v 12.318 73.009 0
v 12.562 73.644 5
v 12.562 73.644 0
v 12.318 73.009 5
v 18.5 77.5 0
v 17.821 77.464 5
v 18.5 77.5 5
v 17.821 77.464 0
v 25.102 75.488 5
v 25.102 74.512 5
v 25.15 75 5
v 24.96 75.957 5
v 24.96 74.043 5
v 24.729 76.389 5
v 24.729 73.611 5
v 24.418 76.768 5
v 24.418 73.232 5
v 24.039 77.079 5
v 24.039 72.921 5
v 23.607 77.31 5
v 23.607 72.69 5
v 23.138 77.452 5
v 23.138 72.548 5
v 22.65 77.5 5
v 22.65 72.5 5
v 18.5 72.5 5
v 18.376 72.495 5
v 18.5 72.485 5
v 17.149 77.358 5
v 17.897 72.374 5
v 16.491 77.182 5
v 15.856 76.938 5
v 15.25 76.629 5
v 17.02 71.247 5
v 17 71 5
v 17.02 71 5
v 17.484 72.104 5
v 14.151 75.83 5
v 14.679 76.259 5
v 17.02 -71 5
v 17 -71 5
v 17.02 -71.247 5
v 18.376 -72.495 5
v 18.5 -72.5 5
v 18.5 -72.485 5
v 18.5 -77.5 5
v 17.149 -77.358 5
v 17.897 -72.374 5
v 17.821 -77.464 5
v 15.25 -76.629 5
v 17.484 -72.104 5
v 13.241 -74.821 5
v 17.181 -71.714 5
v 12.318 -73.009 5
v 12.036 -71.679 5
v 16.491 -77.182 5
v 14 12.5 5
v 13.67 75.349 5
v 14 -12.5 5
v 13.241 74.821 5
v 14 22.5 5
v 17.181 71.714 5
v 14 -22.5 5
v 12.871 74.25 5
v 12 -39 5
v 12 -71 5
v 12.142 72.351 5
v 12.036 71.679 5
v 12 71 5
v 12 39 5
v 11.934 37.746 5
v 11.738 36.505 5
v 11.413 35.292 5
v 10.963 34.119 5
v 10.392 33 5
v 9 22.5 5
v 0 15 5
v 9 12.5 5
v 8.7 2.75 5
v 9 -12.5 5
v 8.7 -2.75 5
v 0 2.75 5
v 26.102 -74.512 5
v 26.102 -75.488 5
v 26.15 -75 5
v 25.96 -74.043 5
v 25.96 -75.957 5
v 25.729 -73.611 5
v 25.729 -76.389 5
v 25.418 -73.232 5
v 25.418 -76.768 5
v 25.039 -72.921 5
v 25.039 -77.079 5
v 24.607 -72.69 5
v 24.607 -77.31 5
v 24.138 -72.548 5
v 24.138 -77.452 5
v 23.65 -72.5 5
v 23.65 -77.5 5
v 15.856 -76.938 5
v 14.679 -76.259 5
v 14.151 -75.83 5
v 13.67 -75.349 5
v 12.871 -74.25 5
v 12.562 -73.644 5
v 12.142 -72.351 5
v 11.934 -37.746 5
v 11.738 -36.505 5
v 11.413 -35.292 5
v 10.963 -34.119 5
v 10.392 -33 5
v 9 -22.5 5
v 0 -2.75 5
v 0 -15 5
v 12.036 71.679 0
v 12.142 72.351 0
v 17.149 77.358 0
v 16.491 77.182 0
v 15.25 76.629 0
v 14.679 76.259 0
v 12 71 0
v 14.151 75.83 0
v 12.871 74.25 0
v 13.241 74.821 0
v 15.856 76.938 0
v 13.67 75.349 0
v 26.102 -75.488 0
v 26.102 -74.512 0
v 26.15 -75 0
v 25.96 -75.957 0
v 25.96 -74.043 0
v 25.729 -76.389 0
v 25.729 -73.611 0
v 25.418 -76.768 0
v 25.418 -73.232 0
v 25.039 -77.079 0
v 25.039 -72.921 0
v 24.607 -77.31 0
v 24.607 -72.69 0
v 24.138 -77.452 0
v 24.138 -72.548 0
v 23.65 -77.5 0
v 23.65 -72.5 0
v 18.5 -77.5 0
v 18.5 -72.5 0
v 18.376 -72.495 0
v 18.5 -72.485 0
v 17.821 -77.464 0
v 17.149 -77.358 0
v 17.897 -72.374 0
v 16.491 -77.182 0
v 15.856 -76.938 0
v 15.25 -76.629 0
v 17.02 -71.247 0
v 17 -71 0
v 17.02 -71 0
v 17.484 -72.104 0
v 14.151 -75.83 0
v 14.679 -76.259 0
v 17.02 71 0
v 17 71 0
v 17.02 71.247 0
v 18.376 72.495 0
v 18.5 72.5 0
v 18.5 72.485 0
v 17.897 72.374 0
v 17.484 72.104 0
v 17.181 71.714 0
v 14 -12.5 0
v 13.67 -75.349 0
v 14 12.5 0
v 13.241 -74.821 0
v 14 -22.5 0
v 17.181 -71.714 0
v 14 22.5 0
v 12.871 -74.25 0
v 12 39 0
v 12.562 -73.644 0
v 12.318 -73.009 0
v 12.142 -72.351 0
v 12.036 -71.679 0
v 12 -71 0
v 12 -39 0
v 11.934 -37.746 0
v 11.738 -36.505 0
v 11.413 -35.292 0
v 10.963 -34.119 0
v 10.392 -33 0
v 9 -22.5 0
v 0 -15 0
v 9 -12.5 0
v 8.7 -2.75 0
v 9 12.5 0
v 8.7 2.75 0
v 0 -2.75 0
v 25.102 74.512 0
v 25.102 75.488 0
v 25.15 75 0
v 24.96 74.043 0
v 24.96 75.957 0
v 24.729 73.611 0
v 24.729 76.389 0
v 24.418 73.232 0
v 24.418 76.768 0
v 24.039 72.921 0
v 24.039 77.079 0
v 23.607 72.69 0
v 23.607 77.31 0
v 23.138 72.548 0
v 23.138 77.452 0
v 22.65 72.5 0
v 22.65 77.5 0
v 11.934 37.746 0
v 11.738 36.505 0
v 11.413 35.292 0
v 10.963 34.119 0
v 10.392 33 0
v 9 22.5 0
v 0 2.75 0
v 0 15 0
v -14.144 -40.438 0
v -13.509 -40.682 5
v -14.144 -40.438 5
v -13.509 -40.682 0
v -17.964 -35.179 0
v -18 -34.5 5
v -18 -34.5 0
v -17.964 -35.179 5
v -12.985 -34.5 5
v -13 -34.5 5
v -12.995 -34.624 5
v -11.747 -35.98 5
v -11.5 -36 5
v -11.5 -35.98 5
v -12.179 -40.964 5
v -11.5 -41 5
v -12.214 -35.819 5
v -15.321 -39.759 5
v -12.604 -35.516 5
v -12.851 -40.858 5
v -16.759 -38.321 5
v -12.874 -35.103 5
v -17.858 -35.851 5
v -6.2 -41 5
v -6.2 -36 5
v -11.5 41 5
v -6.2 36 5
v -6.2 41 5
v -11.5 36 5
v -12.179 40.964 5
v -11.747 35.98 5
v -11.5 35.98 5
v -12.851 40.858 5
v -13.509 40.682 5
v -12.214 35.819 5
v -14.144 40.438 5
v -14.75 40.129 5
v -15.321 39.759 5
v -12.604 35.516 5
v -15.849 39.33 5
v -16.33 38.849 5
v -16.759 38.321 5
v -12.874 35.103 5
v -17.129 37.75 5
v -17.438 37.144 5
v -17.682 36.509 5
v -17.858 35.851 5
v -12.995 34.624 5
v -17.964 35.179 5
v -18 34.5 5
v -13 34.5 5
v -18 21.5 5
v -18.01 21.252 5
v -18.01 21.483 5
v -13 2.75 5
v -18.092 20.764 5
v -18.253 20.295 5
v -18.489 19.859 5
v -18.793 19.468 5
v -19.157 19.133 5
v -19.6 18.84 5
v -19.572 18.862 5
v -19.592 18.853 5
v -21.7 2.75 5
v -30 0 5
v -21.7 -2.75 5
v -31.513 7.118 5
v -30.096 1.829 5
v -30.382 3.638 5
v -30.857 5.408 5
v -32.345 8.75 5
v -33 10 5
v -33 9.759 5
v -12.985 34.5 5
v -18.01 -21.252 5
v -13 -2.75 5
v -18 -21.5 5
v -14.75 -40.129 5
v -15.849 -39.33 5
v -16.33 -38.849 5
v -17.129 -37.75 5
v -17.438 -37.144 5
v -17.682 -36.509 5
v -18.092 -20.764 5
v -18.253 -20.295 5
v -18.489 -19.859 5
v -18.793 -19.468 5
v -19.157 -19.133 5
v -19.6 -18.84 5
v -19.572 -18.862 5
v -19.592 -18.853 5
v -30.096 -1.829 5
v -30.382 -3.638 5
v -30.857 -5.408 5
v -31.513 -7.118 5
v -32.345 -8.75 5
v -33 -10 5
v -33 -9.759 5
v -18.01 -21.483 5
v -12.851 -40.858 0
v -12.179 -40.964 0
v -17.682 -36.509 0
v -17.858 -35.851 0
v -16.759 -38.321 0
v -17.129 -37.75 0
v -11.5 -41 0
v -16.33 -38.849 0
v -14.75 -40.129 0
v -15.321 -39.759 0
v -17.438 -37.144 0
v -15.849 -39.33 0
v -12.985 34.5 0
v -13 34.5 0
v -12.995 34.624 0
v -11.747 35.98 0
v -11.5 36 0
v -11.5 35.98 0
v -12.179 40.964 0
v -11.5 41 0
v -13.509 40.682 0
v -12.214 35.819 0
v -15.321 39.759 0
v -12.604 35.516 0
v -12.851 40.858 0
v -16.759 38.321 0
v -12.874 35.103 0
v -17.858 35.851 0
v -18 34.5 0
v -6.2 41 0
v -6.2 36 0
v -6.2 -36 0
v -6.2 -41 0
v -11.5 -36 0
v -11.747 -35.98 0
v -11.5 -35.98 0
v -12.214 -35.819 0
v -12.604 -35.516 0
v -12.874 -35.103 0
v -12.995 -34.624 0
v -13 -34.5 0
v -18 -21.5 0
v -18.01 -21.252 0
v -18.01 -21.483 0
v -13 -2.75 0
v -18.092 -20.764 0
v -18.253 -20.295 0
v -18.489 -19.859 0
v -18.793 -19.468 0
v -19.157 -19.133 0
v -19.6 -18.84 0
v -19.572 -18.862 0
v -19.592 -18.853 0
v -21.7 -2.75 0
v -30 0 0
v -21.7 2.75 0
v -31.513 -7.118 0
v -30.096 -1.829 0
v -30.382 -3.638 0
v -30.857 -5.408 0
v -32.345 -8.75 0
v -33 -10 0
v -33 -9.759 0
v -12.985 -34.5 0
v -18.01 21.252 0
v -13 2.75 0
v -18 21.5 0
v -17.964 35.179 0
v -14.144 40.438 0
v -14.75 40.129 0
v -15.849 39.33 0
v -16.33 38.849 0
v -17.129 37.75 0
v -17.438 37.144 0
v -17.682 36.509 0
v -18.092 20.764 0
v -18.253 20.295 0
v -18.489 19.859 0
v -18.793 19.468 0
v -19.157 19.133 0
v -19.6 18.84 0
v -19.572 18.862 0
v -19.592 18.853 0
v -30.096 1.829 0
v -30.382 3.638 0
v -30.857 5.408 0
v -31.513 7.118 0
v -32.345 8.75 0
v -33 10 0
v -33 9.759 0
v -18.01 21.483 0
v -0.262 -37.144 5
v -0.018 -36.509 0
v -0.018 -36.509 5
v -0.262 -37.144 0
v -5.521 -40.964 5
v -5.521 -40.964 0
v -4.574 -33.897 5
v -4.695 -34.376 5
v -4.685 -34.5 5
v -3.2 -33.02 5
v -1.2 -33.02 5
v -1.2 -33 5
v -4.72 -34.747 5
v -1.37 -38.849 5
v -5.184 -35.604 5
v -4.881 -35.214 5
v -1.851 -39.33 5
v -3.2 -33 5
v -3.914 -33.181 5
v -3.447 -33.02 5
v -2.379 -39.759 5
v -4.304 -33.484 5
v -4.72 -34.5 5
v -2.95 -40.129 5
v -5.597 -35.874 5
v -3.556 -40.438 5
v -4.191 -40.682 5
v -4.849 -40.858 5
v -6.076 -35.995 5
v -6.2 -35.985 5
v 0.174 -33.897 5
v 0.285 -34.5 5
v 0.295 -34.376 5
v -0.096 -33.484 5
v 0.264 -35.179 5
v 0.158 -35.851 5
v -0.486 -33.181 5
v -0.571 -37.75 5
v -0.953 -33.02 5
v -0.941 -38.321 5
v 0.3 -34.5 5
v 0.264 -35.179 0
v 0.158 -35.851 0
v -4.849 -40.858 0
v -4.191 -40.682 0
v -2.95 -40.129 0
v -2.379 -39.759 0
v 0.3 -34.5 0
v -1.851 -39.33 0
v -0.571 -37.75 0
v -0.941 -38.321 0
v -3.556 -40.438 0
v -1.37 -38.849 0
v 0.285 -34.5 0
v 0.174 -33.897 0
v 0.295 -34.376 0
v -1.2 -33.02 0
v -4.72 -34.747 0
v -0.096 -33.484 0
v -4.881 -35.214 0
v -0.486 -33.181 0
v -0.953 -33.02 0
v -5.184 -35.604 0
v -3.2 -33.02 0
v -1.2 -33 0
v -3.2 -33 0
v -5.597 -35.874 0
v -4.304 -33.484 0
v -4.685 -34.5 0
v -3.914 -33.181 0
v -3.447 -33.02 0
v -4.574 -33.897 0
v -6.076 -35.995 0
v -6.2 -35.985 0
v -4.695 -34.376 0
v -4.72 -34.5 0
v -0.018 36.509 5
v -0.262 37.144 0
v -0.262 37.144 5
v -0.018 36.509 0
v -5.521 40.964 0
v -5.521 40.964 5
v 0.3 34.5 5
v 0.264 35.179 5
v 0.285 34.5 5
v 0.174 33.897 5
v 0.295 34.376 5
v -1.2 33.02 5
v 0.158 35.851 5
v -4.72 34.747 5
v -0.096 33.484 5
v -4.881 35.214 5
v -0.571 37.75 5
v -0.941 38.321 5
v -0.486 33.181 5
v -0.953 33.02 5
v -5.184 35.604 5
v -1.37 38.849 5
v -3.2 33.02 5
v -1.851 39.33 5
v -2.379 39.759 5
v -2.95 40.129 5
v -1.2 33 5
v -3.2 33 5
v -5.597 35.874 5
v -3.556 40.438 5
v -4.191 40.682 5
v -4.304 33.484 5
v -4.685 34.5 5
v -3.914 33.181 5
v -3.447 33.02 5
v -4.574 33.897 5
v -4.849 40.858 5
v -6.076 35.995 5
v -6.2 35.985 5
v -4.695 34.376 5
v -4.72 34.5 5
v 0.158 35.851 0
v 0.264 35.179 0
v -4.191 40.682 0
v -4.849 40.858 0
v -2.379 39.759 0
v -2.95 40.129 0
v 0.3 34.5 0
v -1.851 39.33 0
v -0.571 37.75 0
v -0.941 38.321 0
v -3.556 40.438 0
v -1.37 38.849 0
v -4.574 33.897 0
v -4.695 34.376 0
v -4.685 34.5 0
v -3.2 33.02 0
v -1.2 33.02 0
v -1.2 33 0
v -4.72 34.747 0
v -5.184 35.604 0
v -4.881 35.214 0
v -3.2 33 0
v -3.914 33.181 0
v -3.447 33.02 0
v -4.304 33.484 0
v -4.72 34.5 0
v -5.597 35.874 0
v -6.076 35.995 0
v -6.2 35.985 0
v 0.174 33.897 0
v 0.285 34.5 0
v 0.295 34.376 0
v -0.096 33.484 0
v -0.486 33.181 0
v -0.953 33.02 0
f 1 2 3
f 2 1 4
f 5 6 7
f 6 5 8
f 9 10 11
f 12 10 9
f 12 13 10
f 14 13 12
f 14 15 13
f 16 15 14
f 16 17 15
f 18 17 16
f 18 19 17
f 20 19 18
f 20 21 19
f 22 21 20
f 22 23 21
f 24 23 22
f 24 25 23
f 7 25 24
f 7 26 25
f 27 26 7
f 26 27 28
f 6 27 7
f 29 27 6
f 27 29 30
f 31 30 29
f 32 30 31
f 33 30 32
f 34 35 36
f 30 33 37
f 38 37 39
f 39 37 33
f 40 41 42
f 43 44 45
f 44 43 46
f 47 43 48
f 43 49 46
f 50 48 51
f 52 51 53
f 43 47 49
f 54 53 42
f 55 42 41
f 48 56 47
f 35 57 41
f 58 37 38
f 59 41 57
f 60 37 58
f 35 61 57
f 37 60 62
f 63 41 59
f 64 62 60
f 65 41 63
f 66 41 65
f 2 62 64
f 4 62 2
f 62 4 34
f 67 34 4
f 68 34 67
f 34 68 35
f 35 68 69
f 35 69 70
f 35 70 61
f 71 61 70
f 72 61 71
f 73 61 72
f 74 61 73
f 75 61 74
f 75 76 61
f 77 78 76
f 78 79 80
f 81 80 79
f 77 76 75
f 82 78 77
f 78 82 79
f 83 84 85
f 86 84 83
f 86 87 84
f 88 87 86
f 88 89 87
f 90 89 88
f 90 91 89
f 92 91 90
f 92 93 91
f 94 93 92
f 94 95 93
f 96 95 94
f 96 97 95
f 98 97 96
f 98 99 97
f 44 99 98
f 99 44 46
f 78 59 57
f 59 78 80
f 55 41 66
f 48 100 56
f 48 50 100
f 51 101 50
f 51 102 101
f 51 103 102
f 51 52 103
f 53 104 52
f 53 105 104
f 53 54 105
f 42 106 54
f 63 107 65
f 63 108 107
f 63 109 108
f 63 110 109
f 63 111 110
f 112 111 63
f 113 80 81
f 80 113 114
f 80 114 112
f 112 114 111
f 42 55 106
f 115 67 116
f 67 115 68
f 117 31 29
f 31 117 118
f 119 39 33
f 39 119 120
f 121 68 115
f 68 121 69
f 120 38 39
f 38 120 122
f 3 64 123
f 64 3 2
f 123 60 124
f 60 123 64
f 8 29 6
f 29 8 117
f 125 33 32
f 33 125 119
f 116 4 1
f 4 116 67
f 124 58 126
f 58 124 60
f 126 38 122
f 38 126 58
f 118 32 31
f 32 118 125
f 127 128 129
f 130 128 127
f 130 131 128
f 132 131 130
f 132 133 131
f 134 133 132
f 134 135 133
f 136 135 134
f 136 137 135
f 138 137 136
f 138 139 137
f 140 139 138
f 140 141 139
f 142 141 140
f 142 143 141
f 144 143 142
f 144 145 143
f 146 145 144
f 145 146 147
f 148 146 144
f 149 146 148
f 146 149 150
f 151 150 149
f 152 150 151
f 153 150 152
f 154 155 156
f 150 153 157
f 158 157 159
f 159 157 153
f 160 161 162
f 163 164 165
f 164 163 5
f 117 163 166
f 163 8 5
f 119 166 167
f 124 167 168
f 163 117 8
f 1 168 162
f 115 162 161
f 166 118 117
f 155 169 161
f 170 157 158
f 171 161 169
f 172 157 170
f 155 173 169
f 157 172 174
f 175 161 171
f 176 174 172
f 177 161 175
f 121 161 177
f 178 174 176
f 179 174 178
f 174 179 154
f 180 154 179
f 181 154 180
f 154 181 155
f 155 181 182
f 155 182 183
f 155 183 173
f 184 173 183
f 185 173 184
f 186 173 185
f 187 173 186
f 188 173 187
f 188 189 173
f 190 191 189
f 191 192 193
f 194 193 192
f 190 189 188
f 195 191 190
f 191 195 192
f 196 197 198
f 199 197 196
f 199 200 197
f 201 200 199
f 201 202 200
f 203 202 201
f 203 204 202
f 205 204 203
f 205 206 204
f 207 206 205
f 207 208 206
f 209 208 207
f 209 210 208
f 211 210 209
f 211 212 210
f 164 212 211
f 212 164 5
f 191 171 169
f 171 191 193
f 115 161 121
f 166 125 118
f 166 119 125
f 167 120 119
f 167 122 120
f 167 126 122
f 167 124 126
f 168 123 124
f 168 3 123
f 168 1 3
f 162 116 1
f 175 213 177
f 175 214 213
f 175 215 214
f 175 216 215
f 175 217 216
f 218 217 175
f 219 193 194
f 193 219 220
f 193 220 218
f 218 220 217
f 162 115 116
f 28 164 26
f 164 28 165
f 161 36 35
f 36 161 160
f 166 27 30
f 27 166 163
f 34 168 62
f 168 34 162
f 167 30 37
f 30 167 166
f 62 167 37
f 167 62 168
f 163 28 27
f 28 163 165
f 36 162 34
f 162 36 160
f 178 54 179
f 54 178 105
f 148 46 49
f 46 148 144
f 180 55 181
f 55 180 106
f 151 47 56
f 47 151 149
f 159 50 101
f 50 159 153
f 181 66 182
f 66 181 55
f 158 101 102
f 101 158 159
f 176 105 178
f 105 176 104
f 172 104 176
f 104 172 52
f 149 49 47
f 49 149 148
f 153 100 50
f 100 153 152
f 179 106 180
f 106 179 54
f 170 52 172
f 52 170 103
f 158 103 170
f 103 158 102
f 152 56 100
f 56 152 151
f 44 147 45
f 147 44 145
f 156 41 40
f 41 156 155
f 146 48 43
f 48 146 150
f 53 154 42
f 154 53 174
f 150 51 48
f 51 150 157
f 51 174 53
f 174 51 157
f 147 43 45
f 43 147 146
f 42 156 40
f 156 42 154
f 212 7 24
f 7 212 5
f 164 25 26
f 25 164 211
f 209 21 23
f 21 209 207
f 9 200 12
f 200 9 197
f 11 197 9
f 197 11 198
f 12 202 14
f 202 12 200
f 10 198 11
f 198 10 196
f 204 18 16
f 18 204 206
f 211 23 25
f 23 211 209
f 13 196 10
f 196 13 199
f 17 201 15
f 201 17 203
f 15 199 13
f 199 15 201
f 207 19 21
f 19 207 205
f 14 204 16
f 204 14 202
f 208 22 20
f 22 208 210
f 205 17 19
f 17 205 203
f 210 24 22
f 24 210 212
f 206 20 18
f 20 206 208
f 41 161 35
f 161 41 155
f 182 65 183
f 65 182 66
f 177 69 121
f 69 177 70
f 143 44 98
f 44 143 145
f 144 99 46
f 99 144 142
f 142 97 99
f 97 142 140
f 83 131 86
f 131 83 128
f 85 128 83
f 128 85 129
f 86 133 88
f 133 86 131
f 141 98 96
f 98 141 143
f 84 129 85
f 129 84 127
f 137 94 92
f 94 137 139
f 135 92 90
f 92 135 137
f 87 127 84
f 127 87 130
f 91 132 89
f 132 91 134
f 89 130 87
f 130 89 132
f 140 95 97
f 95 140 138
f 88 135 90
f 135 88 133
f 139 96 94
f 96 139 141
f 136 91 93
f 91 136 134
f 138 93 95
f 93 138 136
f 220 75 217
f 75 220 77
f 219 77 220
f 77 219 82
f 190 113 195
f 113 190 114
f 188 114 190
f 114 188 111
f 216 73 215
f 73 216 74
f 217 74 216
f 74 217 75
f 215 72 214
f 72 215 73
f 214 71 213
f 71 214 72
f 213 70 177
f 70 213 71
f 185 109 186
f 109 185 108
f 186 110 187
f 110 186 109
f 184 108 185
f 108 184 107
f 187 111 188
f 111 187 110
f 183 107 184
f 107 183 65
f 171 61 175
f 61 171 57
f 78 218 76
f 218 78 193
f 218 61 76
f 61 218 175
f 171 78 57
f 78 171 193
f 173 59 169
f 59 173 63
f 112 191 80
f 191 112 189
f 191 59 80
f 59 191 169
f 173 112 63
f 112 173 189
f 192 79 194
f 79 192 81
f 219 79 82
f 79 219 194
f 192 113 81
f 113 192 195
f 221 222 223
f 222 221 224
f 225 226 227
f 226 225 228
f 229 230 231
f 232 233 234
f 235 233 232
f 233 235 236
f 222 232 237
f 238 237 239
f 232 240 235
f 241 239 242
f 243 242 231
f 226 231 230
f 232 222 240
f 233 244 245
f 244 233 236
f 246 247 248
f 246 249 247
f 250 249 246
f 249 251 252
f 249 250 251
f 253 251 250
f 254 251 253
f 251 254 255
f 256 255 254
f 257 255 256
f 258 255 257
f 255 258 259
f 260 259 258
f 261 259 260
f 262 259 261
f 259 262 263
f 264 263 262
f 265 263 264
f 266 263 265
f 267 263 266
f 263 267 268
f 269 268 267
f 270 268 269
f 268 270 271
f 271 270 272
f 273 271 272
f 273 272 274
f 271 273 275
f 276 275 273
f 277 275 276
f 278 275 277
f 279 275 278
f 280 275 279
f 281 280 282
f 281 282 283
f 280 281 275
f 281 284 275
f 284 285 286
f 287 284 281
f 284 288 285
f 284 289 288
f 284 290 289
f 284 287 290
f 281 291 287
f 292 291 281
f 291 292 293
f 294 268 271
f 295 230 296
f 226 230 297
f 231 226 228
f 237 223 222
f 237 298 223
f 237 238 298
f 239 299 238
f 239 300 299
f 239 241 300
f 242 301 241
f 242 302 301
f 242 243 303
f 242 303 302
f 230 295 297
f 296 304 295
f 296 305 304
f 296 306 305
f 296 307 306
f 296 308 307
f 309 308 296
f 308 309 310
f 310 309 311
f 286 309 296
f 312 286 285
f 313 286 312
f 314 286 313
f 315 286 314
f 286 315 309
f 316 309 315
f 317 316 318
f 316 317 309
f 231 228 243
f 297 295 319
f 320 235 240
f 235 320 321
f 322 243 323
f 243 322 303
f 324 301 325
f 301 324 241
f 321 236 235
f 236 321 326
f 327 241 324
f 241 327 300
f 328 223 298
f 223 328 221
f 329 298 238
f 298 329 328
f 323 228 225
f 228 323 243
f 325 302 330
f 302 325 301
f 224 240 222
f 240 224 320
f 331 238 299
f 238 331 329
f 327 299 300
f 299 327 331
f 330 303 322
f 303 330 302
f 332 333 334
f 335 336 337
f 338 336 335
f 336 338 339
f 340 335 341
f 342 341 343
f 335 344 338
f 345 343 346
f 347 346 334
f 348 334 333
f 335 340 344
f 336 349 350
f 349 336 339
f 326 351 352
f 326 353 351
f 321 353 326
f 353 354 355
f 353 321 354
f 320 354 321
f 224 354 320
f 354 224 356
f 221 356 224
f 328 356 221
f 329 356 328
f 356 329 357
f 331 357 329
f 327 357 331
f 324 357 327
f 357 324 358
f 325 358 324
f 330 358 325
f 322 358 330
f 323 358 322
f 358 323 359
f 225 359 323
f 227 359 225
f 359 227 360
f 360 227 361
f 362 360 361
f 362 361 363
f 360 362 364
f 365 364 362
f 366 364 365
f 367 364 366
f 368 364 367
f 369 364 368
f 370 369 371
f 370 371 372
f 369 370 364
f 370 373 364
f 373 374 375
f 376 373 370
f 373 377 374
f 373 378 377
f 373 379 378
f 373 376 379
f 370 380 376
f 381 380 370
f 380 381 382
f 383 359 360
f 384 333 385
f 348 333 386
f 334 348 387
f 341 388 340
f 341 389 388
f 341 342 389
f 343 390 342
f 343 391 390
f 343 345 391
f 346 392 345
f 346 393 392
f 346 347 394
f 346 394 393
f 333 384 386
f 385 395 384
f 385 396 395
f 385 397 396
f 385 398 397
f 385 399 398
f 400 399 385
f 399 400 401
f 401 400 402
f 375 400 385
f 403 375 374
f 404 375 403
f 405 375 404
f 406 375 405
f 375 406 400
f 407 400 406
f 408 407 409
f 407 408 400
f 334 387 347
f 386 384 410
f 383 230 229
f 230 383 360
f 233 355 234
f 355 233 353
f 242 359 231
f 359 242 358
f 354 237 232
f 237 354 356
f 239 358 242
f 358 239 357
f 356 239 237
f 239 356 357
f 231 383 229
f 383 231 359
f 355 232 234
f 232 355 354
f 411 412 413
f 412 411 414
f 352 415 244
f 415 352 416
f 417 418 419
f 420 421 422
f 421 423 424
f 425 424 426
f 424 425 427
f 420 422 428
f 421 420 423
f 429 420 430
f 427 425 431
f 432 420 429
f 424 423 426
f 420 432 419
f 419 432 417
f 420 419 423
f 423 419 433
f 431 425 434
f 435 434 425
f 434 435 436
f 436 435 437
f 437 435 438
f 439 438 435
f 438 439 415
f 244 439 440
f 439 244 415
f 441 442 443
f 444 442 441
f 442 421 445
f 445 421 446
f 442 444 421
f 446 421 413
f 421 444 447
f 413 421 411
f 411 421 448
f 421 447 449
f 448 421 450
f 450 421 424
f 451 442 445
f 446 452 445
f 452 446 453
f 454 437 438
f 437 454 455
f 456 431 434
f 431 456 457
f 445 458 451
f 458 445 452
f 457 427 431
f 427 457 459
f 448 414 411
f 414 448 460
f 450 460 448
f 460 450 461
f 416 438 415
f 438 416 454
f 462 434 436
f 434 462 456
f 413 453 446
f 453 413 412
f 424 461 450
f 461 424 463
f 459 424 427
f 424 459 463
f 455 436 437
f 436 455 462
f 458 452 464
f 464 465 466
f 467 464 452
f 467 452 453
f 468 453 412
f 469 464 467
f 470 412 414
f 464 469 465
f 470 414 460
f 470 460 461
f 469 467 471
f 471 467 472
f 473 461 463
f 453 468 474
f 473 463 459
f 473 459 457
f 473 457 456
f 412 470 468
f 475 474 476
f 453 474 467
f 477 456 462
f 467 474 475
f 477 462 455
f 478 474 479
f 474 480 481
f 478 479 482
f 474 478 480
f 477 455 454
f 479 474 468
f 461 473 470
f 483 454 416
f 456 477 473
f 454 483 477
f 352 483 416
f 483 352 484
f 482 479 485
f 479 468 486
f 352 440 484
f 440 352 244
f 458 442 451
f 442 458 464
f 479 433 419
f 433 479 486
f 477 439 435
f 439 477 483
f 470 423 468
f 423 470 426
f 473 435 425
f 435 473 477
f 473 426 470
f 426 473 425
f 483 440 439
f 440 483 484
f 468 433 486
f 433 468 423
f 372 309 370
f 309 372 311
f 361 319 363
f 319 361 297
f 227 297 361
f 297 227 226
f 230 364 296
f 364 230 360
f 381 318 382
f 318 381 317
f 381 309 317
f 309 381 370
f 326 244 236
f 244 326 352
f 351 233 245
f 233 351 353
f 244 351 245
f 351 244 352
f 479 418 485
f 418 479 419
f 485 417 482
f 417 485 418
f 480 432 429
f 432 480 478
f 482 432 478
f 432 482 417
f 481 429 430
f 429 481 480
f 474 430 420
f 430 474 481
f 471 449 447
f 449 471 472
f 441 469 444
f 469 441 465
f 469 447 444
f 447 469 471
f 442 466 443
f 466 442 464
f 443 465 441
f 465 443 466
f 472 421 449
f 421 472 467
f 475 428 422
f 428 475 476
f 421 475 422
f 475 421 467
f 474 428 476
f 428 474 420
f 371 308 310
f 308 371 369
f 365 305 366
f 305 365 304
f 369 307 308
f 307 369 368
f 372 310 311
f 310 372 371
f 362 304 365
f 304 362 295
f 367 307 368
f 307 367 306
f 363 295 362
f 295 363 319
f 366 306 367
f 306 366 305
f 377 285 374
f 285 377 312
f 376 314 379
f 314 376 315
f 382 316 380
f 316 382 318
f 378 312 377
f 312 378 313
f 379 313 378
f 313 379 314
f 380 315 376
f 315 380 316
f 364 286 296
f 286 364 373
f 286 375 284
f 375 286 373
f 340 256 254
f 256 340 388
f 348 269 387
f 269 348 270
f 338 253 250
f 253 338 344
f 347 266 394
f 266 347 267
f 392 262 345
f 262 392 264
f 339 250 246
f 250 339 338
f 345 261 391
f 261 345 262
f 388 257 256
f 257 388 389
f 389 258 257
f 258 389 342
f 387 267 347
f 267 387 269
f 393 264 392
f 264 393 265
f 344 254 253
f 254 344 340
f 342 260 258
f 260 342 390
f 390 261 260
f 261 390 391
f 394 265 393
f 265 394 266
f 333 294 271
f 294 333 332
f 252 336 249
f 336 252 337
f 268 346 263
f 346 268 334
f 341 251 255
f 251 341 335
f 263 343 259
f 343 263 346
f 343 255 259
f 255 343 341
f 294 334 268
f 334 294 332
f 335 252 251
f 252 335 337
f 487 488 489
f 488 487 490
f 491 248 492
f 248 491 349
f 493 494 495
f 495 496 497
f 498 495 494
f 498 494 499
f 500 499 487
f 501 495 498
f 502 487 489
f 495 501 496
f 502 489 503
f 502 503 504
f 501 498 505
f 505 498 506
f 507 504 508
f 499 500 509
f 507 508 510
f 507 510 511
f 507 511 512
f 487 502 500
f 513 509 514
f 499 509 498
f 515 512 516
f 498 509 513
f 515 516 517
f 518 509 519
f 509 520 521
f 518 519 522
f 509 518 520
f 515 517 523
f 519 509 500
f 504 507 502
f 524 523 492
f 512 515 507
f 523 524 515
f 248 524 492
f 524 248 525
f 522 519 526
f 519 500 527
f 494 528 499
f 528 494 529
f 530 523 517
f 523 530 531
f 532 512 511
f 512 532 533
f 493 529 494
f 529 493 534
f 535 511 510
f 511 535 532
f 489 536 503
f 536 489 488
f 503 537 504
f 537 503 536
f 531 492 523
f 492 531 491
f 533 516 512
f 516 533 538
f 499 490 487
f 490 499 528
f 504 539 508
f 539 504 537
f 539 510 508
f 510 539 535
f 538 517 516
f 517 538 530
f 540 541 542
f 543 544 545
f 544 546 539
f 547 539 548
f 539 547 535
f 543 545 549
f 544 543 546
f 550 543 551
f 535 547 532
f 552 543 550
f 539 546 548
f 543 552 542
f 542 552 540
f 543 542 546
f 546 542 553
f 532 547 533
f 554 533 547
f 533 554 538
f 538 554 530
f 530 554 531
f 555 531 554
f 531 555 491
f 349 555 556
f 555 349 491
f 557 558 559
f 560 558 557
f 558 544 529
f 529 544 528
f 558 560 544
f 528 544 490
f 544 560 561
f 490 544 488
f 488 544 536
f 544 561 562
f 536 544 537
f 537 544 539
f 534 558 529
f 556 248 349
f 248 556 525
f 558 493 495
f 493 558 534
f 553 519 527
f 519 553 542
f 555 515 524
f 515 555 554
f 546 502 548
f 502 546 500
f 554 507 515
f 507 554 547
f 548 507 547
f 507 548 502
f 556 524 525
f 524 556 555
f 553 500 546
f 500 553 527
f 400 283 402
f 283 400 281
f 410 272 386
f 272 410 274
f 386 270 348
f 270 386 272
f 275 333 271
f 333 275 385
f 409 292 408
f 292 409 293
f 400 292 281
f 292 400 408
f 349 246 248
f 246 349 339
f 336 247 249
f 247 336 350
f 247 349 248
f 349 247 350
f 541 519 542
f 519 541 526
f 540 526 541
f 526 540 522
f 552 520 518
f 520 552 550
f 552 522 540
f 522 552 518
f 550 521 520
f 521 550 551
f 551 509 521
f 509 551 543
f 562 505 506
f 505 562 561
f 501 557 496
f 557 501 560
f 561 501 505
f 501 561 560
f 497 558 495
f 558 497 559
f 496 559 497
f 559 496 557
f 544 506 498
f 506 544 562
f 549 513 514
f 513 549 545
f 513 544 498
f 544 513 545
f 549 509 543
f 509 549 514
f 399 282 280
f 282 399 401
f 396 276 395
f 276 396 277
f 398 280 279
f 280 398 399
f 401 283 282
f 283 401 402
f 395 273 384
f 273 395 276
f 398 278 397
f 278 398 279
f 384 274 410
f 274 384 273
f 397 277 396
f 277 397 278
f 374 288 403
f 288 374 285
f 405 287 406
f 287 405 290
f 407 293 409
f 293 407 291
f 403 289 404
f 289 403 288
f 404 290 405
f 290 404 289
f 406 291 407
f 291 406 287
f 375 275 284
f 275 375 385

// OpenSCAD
// Depending on your printer, you should add an extra 1 to 2 mm.
Phone_Length=145;
// Depending on your printer, you should add an extra 1 to 2 mm.
Phone_Width=72;
// Depending on your printer, you should add an extra 1 to 2 mm.
Phone_Thickness = 8.3;
// Offset the phone vertically. This is useful if your phone have side buttons at the middle that is blocked by the side grip. A positive value will shift the phone upwards, while a negative value shifts it downwards.
Vertical_Offset = 0;
// Allow you to attach two vertical pieces instead of one. This can be useful if you want to charge your phone while it's in the holder.
Dual_Vertical = 0; // [8:True, 0:False]
// Trade off between improved grip and ease of insertion/removal. Increasing this number will increase height of the top catch, improving grip but making it harder to remove the phone. The default should be fine for most cases.
Grip = 0;

// Diameter of the bar where the holder is to be mounted.
Handle_Bar_Diameter = 35;
// Distance from the handle bar to the back of the phone. A smaller number will give a lower profile.
Holder_Height = 17; // [11:20]



/* [Hidden] */
$fs = 0.5;
$fa = 6;

module copy_mirror(vec=[0,1,0]) {
 union() {
  children();
  mirror(vec) children();
 }
};

module rounded_corner(vec=[0,0,0],rot=0) {
 translate(vec) rotate([0,0,rot]) difference(){
  intersection(){
   cylinder(r=6.5,h=5);
   translate([-6.5,0,0]) cube([6.5,6.5,5]);
  };
  cylinder(r=1.5,h=5);
 };
};

// Vertical Piece
//translate([2.5,0,0]) rotate([0,-90,0]) difference(){
difference(){
 union() {
  translate ([0,Vertical_Offset,0]) union(){
   translate([18.5,Phone_Length/2,0]) cube([Phone_Thickness/2+Grip,5,5]);
   translate([18.5+Phone_Thickness/2+Grip,Phone_Length/2+2.5,0]) cylinder(r=2.5,h=5);
   copy_mirror([0,1,0]) rounded_corner([18.5,Phone_Length/2-1.5,0]);
   translate([12,-Phone_Length/2+1.5,0]) cube([5,Phone_Length-3,5]);
   translate([18.5,-Phone_Length/2-5,0]) cube([Phone_Thickness/2+1,5,5]);
   translate([19.5+Phone_Thickness/2,-Phone_Length/2-2.5,0]) cylinder(r=2.5,h=5);
//   translate([18.5,-Phone_Length/2-5,0]) cube([Phone_Thickness-1.5,5,5]);
//   translate([17+Phone_Thickness,-Phone_Length/2-2.5,0]) cylinder(r=2.5,h=5);
  };
  linear_extrude(height=5) polygon([[12,-39],[12,39],[10.3923,33],[0,15],[0,-15],[10.3923,-33]]);
 };
 copy_mirror([0,1,0]) translate([0,39,0]) cylinder(r=12,h=5);
 copy_mirror([0,1,0]) translate([9,12.5,0]) cube([5,10,5]);
 translate([17-Holder_Height,-5.5/2,0]) cube([Holder_Height/2+0.2,5.5,5]);
 translate([-Holder_Height,-30,0]) cube([17,60,5]);
};

// Horizontal Piece
//translate([0,2.5,0]) rotate([90,0,0]) copy_mirror([1,0,0]) difference(){
translate([-30,0,0]) rotate([0,0,-90]) copy_mirror([1,0,0]) difference(){
 union(){
//  linear_extrude(height=5) polygon([[0,-3],[10,-3],[14.6768,10.0145],[17.5,12],[Phone_Width/2-1.5,12],[Phone_Width/2-1.5,17],[0,17]]);
  linear_extrude(height=5) polygon([[0,-3],[10,-3],[18.84,10.4],[21.5,12],[Phone_Width/2-1.5,12],[Phone_Width/2-1.5,17],[0,17]]);
  rounded_corner([Phone_Width/2-1.5,18.5,0],180);
  translate([Phone_Width/2,18.5,0]) cube([5,Phone_Thickness-3,5]);
  rounded_corner([Phone_Width/2-1.5,17+Phone_Thickness-1.5,0],-90);
  translate([Phone_Width/2-1.5,17+Phone_Thickness+1.5,0]) cylinder(r=1.5,h=5);
  translate([Phone_Width/2-1.5,17+Phone_Thickness+5-1.5,0]) cylinder(r=1.5,h=5);
  translate([Phone_Width/2-3,17+Phone_Thickness+1.5,0]) cube([1.5,2,5]);
//  translate([5.5/2,17,5/2]) rotate([90,0,0]) linear_extrude(height=20) polygon([[0,0],[5,0],[0,5]]);
 };
 translate([21.5,9,0]) cylinder(r=3,h=5);
 translate([0,-Handle_Bar_Diameter/2-Holder_Height+17,0]) cylinder(r=Handle_Bar_Diameter/2,h=10);
 translate([-5.5/2+Dual_Vertical,17-(Holder_Height/2+0.2),0]) cube([5.5,Holder_Height/2+0.2,5]); // The poorly named Dual_Vertical contains the horizontal offset for the slot.
};
